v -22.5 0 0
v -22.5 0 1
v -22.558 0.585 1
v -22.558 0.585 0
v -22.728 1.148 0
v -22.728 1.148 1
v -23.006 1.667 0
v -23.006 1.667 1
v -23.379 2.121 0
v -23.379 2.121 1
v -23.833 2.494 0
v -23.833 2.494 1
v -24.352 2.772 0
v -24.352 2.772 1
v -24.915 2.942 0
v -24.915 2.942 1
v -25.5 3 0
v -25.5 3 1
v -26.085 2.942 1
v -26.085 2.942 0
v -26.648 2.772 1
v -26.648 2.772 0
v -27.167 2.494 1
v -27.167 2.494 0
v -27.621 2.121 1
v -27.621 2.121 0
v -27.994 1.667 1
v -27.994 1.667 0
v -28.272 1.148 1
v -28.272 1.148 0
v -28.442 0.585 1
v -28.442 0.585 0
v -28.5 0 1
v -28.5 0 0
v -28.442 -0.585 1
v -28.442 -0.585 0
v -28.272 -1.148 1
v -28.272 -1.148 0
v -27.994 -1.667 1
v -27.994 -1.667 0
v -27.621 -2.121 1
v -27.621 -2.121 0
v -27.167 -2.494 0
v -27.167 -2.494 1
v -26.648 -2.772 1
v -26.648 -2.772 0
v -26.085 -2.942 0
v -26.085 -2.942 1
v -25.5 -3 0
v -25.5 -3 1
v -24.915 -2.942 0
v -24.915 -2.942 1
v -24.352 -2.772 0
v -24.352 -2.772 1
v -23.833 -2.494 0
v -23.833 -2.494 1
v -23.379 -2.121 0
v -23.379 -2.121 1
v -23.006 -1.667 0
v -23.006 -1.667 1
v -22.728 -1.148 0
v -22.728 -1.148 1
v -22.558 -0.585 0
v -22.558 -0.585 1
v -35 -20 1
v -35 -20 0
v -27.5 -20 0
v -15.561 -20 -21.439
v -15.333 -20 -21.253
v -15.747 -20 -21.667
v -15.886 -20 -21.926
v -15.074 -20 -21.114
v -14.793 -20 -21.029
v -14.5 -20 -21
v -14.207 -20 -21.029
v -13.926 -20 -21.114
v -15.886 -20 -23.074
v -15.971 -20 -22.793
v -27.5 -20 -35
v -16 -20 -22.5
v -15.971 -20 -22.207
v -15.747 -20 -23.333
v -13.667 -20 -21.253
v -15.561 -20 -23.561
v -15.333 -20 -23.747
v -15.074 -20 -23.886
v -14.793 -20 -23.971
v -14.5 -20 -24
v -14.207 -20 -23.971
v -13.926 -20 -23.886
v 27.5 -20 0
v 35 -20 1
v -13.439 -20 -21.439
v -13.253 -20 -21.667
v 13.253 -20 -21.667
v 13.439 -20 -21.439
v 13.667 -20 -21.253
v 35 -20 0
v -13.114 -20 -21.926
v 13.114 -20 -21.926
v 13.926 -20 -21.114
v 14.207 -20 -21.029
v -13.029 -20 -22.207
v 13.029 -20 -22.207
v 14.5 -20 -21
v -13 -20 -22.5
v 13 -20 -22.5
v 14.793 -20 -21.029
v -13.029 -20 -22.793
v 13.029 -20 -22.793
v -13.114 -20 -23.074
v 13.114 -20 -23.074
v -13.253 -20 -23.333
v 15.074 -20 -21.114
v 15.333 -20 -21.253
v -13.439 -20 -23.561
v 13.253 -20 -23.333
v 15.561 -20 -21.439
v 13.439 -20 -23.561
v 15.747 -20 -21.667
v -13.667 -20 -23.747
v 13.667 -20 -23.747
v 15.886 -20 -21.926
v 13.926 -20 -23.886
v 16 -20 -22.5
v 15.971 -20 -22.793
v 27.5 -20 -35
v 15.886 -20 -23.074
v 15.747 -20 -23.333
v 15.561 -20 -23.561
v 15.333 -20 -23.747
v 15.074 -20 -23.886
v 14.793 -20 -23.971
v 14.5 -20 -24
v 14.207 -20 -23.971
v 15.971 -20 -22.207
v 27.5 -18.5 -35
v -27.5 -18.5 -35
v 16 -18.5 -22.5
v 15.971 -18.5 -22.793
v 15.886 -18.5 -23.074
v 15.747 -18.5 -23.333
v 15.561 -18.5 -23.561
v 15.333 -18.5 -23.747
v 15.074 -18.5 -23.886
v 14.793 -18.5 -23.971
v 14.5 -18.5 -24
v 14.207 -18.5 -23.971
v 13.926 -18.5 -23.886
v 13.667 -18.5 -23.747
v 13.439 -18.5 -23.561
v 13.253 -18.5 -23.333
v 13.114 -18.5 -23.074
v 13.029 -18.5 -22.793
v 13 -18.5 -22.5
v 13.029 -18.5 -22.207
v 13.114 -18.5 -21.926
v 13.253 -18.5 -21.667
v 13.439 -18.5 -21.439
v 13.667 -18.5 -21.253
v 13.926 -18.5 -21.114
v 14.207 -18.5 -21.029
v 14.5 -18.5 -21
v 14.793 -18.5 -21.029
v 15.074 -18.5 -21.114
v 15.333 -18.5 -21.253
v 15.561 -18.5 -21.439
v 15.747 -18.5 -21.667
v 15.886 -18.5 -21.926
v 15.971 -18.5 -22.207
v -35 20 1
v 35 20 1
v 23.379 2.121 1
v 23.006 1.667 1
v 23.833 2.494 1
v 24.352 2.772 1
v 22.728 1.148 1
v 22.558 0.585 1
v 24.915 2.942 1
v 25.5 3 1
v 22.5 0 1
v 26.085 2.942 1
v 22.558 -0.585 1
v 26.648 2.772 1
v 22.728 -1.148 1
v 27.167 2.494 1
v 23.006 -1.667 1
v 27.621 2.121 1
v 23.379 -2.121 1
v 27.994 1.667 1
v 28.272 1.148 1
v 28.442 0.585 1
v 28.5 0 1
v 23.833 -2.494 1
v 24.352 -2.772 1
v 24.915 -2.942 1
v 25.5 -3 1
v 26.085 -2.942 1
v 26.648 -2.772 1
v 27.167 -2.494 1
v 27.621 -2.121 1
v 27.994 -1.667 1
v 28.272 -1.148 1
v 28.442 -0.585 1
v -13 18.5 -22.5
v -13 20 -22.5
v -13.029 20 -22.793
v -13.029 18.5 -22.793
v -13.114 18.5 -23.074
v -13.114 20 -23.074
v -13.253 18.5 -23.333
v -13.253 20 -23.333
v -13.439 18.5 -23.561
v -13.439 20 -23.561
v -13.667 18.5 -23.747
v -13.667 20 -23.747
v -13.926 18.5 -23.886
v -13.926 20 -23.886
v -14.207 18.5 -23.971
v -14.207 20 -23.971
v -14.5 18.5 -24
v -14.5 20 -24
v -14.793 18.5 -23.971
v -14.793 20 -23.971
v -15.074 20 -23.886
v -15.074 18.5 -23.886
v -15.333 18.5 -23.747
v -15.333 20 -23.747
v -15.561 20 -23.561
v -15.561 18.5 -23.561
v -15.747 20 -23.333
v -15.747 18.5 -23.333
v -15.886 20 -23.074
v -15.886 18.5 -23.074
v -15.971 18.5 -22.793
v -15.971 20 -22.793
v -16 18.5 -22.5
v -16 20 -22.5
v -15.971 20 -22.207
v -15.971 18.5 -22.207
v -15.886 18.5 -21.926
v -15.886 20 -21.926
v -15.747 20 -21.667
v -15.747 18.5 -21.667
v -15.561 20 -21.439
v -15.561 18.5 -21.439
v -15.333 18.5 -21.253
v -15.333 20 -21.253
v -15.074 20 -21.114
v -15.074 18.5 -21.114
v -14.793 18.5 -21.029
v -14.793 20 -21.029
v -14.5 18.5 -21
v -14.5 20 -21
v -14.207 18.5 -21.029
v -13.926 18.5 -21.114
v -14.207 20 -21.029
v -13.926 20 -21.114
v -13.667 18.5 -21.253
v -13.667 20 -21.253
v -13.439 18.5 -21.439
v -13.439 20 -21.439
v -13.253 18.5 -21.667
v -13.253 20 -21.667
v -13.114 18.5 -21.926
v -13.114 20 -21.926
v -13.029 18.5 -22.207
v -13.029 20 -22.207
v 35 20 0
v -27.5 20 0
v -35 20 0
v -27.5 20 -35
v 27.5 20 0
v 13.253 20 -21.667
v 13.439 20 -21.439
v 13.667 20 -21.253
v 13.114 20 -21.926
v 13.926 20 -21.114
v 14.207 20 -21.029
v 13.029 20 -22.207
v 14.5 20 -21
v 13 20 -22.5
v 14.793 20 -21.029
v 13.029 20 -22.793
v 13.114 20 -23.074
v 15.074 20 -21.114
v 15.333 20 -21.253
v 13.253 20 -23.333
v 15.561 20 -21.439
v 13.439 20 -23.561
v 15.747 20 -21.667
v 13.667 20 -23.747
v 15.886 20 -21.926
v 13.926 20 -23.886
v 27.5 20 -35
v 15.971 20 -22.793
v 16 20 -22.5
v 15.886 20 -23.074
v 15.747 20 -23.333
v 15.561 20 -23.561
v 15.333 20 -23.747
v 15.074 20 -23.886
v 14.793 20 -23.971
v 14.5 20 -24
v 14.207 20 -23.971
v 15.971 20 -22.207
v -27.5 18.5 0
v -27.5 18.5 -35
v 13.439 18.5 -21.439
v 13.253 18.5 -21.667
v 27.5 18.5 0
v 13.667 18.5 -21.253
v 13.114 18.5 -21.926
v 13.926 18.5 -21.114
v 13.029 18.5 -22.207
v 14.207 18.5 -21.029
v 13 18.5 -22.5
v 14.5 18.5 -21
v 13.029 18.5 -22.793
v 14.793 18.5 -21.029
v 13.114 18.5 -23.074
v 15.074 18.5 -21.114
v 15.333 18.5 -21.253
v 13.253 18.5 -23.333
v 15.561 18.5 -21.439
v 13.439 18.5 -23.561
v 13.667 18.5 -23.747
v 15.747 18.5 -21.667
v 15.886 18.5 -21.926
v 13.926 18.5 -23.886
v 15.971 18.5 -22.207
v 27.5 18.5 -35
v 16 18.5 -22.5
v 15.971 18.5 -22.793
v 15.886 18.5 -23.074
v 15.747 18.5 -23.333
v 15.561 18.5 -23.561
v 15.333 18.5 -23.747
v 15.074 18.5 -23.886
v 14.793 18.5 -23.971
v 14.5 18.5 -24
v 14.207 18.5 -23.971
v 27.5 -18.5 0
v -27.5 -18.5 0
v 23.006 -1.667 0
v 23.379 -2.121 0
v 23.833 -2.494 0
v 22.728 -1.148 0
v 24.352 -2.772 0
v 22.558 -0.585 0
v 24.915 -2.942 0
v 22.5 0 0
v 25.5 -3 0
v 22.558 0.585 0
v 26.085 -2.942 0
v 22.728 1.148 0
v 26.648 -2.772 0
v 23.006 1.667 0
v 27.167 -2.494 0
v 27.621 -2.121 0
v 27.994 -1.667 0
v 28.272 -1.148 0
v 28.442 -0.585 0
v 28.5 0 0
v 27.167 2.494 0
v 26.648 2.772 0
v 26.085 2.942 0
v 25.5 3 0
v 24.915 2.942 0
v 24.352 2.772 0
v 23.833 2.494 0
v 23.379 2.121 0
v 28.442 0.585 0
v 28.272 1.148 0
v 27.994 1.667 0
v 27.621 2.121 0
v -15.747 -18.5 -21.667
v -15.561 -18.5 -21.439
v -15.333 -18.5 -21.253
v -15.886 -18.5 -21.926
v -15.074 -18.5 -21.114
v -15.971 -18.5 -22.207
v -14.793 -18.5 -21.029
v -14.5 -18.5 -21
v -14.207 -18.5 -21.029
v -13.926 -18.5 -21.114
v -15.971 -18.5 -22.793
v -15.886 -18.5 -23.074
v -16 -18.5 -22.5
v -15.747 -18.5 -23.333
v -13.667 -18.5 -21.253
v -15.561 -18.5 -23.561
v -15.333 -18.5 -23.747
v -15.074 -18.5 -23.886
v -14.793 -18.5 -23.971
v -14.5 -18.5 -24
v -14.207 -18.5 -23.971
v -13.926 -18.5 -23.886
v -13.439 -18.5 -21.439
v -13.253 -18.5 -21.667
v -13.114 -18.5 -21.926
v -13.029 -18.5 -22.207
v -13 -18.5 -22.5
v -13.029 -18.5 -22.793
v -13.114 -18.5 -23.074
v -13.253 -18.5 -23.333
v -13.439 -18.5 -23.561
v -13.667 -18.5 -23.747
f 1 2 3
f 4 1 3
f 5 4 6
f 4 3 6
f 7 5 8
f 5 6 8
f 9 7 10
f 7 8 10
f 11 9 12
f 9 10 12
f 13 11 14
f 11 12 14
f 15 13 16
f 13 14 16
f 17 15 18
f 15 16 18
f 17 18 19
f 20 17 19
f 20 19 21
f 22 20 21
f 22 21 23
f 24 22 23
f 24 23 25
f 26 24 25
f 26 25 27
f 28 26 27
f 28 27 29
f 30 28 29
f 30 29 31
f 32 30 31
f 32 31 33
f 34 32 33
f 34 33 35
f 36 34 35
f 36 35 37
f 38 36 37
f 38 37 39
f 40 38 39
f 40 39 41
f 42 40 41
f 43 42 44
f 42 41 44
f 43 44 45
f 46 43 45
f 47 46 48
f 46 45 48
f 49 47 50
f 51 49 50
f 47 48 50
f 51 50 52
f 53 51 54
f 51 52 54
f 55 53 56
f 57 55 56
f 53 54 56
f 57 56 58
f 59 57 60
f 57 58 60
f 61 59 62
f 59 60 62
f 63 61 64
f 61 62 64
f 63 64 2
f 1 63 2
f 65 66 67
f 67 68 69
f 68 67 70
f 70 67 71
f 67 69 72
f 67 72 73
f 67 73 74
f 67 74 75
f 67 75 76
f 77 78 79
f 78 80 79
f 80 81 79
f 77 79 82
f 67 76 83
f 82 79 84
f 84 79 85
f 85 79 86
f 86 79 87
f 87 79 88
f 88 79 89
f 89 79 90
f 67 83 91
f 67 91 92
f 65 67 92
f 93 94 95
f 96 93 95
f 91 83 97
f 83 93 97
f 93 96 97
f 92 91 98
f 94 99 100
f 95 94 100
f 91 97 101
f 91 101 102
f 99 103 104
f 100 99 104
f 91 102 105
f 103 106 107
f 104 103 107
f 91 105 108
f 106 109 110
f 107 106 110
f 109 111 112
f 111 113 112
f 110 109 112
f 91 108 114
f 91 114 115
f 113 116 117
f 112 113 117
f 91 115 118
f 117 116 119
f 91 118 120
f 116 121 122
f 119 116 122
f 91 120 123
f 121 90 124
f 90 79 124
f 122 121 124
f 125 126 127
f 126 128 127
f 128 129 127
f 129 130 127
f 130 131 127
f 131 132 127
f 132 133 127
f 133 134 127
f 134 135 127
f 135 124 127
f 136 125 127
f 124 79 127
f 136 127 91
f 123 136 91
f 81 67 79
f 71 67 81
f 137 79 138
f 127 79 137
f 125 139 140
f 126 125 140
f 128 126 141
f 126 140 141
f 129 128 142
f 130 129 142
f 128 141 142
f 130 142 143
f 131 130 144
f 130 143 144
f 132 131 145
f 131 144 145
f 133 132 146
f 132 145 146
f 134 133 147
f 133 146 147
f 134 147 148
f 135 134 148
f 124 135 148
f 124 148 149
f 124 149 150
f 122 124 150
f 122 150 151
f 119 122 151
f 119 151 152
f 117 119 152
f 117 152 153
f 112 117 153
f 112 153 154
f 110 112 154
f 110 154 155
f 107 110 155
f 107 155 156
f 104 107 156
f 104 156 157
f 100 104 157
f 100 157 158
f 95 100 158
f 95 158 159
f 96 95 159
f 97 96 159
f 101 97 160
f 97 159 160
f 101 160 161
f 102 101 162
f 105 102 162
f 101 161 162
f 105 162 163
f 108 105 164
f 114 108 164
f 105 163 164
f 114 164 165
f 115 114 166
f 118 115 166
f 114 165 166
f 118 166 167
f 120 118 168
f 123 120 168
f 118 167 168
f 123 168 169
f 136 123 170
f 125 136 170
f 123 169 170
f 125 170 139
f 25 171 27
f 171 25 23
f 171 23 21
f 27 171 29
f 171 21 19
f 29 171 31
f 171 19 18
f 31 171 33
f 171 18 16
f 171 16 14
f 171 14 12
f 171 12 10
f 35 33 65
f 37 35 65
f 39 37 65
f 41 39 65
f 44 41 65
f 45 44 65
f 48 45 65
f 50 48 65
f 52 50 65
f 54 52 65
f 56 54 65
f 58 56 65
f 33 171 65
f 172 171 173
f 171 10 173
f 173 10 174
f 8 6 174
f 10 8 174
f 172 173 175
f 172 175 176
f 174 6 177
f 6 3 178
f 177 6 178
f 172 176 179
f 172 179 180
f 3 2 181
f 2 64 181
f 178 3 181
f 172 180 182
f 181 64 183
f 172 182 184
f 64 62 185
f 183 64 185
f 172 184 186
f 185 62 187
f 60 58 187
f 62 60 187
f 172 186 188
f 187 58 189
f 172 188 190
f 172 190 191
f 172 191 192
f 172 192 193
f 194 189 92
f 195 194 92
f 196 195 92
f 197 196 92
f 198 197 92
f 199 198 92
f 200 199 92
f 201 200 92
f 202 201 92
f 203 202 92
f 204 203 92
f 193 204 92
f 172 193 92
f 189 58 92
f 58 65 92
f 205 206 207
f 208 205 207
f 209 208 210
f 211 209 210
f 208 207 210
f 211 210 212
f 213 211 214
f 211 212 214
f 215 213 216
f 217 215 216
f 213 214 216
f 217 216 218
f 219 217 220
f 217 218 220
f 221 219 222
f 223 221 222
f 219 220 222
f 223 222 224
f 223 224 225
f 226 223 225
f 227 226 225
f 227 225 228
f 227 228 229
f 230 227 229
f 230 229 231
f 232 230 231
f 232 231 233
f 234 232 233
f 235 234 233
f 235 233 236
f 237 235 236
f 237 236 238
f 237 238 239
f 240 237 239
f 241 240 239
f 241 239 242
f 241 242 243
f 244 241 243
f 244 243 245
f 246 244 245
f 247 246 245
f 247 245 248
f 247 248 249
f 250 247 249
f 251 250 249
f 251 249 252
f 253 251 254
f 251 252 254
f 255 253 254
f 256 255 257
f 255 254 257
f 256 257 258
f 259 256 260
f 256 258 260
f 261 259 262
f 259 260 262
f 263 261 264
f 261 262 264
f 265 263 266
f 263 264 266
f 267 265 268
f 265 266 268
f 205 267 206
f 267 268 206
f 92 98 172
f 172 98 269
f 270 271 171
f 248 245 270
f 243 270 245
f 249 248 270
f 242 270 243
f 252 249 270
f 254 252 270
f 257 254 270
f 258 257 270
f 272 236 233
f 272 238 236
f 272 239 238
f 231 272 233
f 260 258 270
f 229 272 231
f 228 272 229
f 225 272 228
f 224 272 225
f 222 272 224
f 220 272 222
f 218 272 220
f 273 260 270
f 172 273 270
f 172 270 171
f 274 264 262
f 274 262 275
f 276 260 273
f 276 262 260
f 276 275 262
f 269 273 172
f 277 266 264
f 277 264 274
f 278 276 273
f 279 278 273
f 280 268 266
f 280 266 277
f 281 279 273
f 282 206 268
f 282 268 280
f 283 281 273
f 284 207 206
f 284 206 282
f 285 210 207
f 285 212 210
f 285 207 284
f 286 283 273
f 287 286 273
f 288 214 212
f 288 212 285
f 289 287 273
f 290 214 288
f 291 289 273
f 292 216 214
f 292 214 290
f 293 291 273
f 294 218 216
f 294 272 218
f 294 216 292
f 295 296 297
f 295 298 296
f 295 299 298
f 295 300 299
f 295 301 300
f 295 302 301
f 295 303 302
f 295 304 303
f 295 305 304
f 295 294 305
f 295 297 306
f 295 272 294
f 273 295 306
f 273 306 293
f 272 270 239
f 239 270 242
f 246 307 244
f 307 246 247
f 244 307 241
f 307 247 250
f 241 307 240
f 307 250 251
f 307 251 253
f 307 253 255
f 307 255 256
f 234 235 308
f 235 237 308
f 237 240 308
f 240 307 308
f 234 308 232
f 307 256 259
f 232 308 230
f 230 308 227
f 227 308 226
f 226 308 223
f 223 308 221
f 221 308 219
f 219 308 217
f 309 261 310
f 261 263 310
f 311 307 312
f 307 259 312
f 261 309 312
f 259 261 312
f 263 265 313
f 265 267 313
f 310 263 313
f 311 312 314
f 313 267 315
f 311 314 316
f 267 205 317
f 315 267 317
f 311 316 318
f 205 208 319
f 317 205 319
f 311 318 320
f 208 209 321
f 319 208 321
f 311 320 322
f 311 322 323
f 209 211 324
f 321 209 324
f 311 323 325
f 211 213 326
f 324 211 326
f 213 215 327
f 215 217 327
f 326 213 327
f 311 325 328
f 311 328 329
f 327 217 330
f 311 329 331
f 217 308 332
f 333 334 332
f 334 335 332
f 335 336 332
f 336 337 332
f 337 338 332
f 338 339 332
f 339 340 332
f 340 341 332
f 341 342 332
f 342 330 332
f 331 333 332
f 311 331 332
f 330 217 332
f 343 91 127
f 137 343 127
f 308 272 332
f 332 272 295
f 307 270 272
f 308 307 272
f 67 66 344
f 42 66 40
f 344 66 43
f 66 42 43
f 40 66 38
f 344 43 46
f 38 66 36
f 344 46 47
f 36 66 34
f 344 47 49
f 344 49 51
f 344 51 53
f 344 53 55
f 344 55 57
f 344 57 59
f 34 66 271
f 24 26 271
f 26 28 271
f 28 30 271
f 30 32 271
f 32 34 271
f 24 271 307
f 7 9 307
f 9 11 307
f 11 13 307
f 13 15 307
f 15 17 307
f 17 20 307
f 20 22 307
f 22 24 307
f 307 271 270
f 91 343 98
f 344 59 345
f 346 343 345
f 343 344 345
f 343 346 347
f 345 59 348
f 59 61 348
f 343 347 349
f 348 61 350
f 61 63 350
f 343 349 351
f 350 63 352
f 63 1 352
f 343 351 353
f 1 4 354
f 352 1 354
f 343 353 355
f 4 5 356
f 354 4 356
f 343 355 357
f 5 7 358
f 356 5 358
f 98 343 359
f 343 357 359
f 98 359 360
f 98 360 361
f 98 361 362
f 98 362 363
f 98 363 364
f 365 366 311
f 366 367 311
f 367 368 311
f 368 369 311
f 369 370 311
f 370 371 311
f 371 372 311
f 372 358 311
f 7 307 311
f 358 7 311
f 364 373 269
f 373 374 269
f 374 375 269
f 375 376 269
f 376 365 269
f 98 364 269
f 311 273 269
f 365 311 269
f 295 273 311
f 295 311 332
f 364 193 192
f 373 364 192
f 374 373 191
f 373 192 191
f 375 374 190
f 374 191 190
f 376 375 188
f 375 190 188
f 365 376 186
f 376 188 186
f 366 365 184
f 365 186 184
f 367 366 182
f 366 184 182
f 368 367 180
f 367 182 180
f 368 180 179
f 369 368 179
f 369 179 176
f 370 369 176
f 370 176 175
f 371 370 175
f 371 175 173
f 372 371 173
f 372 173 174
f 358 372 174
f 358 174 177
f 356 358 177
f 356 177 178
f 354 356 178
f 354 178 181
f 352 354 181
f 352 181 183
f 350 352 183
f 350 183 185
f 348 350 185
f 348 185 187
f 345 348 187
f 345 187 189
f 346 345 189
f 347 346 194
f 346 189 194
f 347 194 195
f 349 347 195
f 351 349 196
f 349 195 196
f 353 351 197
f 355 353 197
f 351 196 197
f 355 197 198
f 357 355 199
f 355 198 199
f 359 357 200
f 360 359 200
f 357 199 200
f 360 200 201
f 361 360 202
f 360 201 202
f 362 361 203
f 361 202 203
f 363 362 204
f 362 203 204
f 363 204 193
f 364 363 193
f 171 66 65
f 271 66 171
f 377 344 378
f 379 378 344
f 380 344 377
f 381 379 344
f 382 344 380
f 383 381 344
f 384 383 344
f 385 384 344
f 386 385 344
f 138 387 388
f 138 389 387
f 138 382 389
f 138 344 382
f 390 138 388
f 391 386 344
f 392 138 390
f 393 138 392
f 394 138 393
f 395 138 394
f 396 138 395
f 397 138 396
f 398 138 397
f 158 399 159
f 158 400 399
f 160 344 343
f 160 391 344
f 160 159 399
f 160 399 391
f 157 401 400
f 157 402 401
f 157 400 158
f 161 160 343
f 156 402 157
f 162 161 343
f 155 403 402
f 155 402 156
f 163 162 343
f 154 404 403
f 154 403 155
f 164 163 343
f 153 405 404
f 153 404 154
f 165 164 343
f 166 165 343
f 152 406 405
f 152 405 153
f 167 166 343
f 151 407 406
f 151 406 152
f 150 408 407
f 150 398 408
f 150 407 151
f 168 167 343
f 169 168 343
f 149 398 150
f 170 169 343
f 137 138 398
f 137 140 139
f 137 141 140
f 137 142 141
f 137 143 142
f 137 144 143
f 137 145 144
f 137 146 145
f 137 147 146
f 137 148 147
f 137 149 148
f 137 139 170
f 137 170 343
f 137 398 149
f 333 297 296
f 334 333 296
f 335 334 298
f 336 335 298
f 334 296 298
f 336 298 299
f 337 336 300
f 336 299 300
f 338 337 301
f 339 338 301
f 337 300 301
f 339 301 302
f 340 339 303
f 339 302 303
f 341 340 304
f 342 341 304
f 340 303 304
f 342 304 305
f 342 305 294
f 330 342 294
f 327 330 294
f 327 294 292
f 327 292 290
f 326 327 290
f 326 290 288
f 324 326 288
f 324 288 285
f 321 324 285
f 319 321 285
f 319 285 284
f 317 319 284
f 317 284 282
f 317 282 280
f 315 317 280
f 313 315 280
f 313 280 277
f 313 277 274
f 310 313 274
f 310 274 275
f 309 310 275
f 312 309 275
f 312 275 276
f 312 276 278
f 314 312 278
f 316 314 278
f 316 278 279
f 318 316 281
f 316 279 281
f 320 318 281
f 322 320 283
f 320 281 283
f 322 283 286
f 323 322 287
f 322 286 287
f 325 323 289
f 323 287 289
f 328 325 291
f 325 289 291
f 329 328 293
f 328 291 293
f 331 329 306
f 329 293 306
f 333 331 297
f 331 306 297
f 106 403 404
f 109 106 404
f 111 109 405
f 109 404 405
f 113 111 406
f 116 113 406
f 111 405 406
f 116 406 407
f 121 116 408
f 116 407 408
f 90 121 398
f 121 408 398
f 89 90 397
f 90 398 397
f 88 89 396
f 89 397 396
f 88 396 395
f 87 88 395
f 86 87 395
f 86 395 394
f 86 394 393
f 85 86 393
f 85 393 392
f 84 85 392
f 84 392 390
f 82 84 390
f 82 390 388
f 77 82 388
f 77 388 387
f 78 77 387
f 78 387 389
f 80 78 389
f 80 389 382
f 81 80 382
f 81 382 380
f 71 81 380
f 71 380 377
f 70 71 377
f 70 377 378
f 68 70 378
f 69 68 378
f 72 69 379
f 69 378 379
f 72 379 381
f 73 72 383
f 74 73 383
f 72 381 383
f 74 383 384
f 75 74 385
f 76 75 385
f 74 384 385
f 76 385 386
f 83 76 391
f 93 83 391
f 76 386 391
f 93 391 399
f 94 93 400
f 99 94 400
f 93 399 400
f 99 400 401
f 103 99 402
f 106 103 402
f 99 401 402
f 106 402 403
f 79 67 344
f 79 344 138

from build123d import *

# Parameters (mm, degrees)
SKETCH_1_W          = 70
SKETCH_1_H          = 40
EXTRUDE_1_DEPTH     = 1
SKETCH_2_R          = 3
CUT_EXTRUDE_1_DEPTH = 10
SKETCH_4_W          = 55
SKETCH_4_H          = 36
EXTRUDE_2_DEPTH     = 1.5
EXTRUDE_START       = -40
SKETCH_4_2_W        = 55
SKETCH_4_2_H        = 36
EXTRUDE_3_DEPTH     = 1.5
SKETCH_5_R          = 1.5
CUT_EXTRUDE_2_DEPTH = 41


with BuildPart() as part:
    # 草图1 → 凸台-拉伸1 (new body)
    with BuildSketch(Plane.XY):
        Rectangle(SKETCH_1_W, SKETCH_1_H)
    extrude(amount=EXTRUDE_1_DEPTH)

    # 草图2 → 切除-拉伸1 (cut)
    with BuildSketch(Plane.XY.offset(1)):
        with Locations((-25.5, 0)):
            Circle(SKETCH_2_R)
        with Locations((25.5, 0)):
            Circle(SKETCH_2_R)
    extrude(amount=-CUT_EXTRUDE_1_DEPTH, mode=Mode.SUBTRACT)

    # 草图4 → 凸台-拉伸2 (add)
    with BuildSketch(Plane(origin=(0, 20, 0), x_dir=(1, 0, 0), z_dir=(0, 1, 0))):
        with Locations((0, 17)):
            Rectangle(SKETCH_4_W, SKETCH_4_H)
    extrude(amount=-EXTRUDE_2_DEPTH)

    # 草图4<2> → 凸台-拉伸3 (add)
    with BuildSketch(Plane(origin=(0, 20, 0), x_dir=(1, 0, 0), z_dir=(0, 1, 0)).offset(EXTRUDE_START)):
        with Locations((0, 17)):
            Rectangle(SKETCH_4_2_W, SKETCH_4_2_H)
    extrude(amount=EXTRUDE_3_DEPTH)

    # 草图5 → 切除-拉伸2 (cut, through all)
    with BuildSketch(Plane(origin=(0, 20, 0), x_dir=(1, 0, 0), z_dir=(0, 1, 0))):
        with Locations((-14.5, 22.5)):
            Circle(SKETCH_5_R)
        with Locations((14.5, 22.5)):
            Circle(SKETCH_5_R)
    extrude(amount=-CUT_EXTRUDE_2_DEPTH, mode=Mode.SUBTRACT)


solid = part.part
